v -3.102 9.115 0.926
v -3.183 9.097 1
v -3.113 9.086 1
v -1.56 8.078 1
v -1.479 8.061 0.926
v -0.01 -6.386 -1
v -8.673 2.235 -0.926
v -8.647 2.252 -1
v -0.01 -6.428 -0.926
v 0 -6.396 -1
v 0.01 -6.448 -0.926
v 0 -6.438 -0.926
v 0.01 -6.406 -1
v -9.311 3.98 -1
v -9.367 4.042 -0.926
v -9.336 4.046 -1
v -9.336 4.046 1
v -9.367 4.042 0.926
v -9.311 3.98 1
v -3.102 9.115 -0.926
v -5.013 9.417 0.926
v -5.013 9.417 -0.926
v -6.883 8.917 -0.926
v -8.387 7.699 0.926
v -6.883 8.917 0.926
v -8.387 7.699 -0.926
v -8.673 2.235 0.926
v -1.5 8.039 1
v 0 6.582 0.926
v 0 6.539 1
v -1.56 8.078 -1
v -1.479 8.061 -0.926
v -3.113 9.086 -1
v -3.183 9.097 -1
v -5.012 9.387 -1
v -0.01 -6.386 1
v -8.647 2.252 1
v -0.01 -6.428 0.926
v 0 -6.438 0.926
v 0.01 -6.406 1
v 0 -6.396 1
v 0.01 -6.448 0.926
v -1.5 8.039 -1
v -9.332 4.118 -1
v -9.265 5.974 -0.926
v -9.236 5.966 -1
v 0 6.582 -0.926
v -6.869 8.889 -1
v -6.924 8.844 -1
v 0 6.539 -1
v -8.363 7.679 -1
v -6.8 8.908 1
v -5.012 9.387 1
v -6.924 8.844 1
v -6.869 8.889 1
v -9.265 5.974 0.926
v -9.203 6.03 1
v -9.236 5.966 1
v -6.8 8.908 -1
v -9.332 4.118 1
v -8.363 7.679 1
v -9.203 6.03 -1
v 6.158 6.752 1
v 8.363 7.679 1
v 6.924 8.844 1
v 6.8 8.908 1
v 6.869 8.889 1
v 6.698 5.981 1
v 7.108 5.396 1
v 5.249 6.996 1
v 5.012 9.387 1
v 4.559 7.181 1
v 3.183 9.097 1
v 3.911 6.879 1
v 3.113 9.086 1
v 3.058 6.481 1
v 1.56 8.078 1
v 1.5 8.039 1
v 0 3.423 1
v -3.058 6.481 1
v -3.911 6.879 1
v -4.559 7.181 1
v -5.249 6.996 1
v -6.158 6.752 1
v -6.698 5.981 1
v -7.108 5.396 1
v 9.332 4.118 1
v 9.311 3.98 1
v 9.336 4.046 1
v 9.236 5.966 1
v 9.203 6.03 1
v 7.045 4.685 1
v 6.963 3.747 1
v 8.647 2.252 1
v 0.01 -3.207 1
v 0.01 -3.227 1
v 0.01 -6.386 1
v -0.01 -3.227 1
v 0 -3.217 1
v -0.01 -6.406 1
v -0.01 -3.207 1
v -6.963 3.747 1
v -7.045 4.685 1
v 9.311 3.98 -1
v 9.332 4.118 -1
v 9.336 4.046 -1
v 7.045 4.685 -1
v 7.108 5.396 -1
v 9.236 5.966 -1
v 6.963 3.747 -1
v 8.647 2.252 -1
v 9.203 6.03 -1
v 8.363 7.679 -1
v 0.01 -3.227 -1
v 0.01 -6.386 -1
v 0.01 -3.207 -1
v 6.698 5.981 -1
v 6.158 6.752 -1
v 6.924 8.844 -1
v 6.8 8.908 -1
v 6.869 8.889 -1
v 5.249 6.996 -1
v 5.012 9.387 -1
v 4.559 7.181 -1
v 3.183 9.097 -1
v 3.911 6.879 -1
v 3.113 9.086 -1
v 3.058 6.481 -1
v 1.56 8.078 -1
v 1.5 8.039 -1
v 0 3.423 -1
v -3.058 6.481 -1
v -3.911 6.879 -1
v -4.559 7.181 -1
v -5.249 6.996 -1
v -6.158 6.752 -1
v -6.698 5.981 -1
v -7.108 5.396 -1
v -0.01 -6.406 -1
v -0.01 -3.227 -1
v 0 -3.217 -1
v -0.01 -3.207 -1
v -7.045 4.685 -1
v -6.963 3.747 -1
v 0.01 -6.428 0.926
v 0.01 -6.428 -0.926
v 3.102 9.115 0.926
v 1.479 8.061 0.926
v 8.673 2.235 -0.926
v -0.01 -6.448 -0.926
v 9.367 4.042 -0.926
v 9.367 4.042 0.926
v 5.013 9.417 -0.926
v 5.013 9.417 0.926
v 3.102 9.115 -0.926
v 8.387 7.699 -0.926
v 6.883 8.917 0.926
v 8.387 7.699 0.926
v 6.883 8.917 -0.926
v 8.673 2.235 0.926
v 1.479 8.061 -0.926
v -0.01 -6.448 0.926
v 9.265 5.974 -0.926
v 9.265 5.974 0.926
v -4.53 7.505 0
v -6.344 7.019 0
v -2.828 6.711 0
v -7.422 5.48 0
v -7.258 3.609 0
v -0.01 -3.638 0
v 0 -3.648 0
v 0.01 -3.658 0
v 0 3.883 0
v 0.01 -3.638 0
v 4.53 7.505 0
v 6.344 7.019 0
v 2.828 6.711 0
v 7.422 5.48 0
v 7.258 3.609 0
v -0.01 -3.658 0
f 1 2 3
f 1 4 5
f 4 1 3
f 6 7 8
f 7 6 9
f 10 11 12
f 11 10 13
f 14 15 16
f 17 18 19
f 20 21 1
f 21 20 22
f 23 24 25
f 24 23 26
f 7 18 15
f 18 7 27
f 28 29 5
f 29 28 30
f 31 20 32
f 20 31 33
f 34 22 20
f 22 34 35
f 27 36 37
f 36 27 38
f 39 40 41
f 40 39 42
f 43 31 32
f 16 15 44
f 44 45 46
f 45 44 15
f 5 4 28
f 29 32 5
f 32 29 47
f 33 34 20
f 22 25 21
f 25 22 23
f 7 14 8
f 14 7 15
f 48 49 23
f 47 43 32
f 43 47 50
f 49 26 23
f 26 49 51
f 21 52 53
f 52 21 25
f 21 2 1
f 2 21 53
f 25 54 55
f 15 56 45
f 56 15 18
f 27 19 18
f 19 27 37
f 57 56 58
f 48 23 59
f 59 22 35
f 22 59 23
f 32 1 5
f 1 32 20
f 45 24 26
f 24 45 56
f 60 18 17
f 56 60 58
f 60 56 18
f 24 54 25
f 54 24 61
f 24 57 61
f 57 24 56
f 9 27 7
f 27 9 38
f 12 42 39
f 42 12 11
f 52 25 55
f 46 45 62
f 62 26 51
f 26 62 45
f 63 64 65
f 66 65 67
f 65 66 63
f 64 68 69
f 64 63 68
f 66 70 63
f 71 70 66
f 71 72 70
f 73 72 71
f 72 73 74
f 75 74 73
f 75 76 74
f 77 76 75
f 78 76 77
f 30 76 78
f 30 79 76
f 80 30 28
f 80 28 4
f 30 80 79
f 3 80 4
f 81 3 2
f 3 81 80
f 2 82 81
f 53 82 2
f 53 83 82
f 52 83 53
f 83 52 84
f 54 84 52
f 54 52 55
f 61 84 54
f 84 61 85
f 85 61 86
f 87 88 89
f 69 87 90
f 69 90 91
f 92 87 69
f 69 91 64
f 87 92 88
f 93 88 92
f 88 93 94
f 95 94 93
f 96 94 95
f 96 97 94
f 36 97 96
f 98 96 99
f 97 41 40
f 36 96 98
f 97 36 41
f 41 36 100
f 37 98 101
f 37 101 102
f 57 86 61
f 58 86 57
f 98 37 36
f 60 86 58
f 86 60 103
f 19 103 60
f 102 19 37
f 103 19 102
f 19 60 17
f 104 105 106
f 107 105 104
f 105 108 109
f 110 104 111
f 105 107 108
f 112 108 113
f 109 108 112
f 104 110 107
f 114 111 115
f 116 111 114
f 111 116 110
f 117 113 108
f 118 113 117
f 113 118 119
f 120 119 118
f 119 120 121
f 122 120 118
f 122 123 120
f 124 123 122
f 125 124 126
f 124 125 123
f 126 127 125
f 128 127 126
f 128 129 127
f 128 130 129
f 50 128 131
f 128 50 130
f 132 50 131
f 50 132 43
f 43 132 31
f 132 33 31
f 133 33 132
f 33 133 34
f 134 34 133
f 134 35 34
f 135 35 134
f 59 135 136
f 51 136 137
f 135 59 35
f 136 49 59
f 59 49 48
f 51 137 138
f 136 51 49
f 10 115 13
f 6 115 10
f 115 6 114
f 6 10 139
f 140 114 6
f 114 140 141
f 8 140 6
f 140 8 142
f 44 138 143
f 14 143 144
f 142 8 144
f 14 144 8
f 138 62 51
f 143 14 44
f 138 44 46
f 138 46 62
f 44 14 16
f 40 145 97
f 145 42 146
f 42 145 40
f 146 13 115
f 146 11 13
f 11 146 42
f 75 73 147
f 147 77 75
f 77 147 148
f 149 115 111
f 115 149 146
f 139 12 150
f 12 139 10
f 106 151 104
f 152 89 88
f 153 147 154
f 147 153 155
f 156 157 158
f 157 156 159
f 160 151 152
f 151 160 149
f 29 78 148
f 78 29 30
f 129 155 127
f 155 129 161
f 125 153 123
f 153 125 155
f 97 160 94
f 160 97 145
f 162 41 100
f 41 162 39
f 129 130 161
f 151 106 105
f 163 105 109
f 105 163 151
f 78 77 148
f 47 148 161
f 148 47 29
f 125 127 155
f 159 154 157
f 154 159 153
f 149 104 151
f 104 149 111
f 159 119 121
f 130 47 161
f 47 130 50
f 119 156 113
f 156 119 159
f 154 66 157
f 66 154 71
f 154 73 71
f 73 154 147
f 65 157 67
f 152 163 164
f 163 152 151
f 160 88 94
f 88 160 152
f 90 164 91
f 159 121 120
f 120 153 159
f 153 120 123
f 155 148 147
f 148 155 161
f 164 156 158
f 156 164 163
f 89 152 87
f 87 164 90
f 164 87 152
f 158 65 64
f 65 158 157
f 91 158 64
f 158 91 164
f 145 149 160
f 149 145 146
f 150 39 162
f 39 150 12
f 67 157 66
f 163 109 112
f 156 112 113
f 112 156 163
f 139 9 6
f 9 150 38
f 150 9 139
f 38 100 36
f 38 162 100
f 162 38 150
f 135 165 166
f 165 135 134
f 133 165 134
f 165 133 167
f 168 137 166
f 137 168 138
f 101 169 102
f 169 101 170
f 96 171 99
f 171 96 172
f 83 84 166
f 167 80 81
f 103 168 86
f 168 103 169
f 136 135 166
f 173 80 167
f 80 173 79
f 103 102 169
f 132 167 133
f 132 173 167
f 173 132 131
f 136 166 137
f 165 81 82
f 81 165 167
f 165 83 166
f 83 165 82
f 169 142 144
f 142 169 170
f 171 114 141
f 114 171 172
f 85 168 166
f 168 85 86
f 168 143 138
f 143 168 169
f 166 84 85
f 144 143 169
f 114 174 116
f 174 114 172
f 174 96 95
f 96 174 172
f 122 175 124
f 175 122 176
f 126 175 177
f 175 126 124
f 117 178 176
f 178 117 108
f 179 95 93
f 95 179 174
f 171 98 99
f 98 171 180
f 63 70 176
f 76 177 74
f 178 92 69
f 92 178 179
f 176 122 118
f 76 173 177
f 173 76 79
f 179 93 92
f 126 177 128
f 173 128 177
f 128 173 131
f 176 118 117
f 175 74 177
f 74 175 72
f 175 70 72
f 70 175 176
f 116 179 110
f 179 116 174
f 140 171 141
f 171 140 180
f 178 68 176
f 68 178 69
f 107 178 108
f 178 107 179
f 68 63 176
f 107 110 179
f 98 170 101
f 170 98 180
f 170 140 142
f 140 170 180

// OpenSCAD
heart(20+2, 10, 2);

// based on https://www.revk.uk/2017/02/opnescad-with-some-heart.html

module heart(width, H, wall = 0, half = false) {
  W = width / 65.23 * 40;
  L = width / 65.23 * 80;
  A = atan2(W, L - W);

  if (wall == 0)
    solid_heart(W, L, A, H, 0, 0, half);
  else {
    difference () {
      solid_heart(W, L, A, H, wall, wall * 2, half);
      solid_heart(W, L, A, H, wall * 2, wall, half);
    }
  } 
}

module solid_heart(W, L, A, H, dh, dv, half) {
  rotate([0, 0, A])
  solid_half(W, L, A, H, dh, dv, half);
  
  mirror([1, 0, 0])
  rotate([0, 0, A])
  solid_half(W, L, A, H, dh, dv, half);
}


module solid_half(W, L, A, H, dh, dv, half) {
  difference ()
  {
    hull () {
      translate([0, (L-W)/2, 0])
      sphere(d = W - dh*2);
      
      translate([0, (W-L)/2, 0])
      sphere(d = W - dh*2);
    }

    translate([-L, -L, H/2 - dv])
    cube([L*2, L*2, W]);
    
    translate([-L, -L, -H/2 - W + dv])
    cube([L*2, L*2, W]);
    
    rotate([0, 0, A])
    translate([-L/2, -L + (half ? dh : -0.01), -H])
    cube([L, L, H*2]);
  }
}
